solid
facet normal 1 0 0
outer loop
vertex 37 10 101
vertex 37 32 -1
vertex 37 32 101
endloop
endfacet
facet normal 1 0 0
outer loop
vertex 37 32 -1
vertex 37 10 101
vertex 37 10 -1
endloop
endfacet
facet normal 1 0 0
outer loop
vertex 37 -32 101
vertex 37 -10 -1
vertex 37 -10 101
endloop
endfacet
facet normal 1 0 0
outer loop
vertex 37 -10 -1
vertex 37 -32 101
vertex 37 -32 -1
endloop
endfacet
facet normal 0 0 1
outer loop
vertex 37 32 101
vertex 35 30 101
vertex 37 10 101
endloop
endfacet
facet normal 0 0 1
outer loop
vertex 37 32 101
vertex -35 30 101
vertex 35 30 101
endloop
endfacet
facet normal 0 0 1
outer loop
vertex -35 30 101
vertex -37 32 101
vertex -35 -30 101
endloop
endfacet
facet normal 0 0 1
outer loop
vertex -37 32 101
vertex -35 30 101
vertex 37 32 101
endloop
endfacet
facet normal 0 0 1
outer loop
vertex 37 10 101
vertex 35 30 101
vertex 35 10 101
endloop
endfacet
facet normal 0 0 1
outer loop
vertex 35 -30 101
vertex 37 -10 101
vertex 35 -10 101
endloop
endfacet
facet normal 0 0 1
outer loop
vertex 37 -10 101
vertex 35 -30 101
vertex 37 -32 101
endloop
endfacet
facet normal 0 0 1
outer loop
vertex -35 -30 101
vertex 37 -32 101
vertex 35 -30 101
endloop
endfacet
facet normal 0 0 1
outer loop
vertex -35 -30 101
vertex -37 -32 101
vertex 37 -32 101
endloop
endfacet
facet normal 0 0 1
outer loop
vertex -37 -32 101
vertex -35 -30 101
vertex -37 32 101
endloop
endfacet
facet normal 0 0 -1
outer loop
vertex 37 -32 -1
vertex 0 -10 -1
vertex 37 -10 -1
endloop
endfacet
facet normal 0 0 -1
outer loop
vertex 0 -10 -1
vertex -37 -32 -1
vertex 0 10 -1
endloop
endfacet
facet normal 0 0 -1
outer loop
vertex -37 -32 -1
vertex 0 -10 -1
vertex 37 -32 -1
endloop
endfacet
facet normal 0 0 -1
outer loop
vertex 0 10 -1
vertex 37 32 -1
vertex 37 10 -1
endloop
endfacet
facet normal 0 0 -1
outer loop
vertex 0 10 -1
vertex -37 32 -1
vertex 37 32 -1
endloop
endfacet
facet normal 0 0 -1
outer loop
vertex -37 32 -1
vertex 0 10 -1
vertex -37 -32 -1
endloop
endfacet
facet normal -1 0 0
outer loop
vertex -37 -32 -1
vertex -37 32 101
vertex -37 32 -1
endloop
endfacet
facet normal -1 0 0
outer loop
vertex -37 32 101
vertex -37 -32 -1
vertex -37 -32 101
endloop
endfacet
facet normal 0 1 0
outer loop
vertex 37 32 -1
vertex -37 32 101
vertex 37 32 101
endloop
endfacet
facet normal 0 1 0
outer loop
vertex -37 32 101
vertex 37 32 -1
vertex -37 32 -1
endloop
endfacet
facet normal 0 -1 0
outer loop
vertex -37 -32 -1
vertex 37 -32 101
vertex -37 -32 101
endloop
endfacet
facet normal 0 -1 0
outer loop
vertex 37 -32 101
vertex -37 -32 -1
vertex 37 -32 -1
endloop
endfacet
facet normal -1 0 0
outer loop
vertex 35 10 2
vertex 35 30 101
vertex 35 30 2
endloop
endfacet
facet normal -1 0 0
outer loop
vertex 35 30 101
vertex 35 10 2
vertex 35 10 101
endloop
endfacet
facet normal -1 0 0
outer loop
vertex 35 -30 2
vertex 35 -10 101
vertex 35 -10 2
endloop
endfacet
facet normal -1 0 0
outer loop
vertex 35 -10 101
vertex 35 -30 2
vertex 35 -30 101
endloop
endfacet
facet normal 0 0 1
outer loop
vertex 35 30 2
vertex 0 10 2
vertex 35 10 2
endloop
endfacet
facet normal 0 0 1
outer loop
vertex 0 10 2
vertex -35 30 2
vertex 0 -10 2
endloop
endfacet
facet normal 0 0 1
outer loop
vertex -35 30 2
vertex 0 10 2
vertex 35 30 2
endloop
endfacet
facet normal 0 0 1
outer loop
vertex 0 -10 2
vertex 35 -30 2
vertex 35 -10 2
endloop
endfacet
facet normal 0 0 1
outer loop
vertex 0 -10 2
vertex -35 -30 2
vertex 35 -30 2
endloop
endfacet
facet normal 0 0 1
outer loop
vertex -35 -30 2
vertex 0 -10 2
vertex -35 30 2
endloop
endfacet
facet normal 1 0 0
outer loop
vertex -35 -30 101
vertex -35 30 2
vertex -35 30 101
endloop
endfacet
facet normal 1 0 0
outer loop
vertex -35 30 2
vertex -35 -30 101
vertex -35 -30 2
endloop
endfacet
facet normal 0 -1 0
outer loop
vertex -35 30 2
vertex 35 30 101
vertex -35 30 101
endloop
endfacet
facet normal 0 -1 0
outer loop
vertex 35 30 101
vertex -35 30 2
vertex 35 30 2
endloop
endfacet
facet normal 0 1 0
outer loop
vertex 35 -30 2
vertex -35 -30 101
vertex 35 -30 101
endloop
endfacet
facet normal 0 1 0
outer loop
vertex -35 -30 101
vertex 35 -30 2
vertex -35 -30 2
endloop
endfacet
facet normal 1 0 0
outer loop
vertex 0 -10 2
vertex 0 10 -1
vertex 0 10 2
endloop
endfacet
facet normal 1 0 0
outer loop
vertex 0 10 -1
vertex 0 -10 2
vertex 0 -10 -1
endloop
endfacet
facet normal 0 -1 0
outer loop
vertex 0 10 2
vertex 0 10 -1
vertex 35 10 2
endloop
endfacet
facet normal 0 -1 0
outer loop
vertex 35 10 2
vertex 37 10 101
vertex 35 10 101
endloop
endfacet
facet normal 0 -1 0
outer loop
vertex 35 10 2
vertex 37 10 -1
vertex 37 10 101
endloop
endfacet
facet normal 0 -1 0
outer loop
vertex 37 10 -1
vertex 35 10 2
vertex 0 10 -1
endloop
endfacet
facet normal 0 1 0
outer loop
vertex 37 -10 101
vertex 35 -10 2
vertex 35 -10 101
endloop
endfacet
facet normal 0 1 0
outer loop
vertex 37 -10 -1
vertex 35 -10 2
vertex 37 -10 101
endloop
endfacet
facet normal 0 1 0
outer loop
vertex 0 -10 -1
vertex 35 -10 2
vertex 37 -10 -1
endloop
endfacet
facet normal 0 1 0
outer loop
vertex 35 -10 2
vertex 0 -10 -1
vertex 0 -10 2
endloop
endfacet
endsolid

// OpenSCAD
height = 70;
width = 60;
thickness = 5;

scum = 2;
set = 20;

translate([0, 0, thickness*set/2]){
    difference(){
        cube([height+scum*2, width+scum*2, thickness*set+scum], true);
        translate([0, 0, scum]){
            cube([height, width, thickness*set], true);
                }
        translate([height/2, 0, 0]){
            cube([height, width/3, thickness*set+scum], true);
        }
    }
}
